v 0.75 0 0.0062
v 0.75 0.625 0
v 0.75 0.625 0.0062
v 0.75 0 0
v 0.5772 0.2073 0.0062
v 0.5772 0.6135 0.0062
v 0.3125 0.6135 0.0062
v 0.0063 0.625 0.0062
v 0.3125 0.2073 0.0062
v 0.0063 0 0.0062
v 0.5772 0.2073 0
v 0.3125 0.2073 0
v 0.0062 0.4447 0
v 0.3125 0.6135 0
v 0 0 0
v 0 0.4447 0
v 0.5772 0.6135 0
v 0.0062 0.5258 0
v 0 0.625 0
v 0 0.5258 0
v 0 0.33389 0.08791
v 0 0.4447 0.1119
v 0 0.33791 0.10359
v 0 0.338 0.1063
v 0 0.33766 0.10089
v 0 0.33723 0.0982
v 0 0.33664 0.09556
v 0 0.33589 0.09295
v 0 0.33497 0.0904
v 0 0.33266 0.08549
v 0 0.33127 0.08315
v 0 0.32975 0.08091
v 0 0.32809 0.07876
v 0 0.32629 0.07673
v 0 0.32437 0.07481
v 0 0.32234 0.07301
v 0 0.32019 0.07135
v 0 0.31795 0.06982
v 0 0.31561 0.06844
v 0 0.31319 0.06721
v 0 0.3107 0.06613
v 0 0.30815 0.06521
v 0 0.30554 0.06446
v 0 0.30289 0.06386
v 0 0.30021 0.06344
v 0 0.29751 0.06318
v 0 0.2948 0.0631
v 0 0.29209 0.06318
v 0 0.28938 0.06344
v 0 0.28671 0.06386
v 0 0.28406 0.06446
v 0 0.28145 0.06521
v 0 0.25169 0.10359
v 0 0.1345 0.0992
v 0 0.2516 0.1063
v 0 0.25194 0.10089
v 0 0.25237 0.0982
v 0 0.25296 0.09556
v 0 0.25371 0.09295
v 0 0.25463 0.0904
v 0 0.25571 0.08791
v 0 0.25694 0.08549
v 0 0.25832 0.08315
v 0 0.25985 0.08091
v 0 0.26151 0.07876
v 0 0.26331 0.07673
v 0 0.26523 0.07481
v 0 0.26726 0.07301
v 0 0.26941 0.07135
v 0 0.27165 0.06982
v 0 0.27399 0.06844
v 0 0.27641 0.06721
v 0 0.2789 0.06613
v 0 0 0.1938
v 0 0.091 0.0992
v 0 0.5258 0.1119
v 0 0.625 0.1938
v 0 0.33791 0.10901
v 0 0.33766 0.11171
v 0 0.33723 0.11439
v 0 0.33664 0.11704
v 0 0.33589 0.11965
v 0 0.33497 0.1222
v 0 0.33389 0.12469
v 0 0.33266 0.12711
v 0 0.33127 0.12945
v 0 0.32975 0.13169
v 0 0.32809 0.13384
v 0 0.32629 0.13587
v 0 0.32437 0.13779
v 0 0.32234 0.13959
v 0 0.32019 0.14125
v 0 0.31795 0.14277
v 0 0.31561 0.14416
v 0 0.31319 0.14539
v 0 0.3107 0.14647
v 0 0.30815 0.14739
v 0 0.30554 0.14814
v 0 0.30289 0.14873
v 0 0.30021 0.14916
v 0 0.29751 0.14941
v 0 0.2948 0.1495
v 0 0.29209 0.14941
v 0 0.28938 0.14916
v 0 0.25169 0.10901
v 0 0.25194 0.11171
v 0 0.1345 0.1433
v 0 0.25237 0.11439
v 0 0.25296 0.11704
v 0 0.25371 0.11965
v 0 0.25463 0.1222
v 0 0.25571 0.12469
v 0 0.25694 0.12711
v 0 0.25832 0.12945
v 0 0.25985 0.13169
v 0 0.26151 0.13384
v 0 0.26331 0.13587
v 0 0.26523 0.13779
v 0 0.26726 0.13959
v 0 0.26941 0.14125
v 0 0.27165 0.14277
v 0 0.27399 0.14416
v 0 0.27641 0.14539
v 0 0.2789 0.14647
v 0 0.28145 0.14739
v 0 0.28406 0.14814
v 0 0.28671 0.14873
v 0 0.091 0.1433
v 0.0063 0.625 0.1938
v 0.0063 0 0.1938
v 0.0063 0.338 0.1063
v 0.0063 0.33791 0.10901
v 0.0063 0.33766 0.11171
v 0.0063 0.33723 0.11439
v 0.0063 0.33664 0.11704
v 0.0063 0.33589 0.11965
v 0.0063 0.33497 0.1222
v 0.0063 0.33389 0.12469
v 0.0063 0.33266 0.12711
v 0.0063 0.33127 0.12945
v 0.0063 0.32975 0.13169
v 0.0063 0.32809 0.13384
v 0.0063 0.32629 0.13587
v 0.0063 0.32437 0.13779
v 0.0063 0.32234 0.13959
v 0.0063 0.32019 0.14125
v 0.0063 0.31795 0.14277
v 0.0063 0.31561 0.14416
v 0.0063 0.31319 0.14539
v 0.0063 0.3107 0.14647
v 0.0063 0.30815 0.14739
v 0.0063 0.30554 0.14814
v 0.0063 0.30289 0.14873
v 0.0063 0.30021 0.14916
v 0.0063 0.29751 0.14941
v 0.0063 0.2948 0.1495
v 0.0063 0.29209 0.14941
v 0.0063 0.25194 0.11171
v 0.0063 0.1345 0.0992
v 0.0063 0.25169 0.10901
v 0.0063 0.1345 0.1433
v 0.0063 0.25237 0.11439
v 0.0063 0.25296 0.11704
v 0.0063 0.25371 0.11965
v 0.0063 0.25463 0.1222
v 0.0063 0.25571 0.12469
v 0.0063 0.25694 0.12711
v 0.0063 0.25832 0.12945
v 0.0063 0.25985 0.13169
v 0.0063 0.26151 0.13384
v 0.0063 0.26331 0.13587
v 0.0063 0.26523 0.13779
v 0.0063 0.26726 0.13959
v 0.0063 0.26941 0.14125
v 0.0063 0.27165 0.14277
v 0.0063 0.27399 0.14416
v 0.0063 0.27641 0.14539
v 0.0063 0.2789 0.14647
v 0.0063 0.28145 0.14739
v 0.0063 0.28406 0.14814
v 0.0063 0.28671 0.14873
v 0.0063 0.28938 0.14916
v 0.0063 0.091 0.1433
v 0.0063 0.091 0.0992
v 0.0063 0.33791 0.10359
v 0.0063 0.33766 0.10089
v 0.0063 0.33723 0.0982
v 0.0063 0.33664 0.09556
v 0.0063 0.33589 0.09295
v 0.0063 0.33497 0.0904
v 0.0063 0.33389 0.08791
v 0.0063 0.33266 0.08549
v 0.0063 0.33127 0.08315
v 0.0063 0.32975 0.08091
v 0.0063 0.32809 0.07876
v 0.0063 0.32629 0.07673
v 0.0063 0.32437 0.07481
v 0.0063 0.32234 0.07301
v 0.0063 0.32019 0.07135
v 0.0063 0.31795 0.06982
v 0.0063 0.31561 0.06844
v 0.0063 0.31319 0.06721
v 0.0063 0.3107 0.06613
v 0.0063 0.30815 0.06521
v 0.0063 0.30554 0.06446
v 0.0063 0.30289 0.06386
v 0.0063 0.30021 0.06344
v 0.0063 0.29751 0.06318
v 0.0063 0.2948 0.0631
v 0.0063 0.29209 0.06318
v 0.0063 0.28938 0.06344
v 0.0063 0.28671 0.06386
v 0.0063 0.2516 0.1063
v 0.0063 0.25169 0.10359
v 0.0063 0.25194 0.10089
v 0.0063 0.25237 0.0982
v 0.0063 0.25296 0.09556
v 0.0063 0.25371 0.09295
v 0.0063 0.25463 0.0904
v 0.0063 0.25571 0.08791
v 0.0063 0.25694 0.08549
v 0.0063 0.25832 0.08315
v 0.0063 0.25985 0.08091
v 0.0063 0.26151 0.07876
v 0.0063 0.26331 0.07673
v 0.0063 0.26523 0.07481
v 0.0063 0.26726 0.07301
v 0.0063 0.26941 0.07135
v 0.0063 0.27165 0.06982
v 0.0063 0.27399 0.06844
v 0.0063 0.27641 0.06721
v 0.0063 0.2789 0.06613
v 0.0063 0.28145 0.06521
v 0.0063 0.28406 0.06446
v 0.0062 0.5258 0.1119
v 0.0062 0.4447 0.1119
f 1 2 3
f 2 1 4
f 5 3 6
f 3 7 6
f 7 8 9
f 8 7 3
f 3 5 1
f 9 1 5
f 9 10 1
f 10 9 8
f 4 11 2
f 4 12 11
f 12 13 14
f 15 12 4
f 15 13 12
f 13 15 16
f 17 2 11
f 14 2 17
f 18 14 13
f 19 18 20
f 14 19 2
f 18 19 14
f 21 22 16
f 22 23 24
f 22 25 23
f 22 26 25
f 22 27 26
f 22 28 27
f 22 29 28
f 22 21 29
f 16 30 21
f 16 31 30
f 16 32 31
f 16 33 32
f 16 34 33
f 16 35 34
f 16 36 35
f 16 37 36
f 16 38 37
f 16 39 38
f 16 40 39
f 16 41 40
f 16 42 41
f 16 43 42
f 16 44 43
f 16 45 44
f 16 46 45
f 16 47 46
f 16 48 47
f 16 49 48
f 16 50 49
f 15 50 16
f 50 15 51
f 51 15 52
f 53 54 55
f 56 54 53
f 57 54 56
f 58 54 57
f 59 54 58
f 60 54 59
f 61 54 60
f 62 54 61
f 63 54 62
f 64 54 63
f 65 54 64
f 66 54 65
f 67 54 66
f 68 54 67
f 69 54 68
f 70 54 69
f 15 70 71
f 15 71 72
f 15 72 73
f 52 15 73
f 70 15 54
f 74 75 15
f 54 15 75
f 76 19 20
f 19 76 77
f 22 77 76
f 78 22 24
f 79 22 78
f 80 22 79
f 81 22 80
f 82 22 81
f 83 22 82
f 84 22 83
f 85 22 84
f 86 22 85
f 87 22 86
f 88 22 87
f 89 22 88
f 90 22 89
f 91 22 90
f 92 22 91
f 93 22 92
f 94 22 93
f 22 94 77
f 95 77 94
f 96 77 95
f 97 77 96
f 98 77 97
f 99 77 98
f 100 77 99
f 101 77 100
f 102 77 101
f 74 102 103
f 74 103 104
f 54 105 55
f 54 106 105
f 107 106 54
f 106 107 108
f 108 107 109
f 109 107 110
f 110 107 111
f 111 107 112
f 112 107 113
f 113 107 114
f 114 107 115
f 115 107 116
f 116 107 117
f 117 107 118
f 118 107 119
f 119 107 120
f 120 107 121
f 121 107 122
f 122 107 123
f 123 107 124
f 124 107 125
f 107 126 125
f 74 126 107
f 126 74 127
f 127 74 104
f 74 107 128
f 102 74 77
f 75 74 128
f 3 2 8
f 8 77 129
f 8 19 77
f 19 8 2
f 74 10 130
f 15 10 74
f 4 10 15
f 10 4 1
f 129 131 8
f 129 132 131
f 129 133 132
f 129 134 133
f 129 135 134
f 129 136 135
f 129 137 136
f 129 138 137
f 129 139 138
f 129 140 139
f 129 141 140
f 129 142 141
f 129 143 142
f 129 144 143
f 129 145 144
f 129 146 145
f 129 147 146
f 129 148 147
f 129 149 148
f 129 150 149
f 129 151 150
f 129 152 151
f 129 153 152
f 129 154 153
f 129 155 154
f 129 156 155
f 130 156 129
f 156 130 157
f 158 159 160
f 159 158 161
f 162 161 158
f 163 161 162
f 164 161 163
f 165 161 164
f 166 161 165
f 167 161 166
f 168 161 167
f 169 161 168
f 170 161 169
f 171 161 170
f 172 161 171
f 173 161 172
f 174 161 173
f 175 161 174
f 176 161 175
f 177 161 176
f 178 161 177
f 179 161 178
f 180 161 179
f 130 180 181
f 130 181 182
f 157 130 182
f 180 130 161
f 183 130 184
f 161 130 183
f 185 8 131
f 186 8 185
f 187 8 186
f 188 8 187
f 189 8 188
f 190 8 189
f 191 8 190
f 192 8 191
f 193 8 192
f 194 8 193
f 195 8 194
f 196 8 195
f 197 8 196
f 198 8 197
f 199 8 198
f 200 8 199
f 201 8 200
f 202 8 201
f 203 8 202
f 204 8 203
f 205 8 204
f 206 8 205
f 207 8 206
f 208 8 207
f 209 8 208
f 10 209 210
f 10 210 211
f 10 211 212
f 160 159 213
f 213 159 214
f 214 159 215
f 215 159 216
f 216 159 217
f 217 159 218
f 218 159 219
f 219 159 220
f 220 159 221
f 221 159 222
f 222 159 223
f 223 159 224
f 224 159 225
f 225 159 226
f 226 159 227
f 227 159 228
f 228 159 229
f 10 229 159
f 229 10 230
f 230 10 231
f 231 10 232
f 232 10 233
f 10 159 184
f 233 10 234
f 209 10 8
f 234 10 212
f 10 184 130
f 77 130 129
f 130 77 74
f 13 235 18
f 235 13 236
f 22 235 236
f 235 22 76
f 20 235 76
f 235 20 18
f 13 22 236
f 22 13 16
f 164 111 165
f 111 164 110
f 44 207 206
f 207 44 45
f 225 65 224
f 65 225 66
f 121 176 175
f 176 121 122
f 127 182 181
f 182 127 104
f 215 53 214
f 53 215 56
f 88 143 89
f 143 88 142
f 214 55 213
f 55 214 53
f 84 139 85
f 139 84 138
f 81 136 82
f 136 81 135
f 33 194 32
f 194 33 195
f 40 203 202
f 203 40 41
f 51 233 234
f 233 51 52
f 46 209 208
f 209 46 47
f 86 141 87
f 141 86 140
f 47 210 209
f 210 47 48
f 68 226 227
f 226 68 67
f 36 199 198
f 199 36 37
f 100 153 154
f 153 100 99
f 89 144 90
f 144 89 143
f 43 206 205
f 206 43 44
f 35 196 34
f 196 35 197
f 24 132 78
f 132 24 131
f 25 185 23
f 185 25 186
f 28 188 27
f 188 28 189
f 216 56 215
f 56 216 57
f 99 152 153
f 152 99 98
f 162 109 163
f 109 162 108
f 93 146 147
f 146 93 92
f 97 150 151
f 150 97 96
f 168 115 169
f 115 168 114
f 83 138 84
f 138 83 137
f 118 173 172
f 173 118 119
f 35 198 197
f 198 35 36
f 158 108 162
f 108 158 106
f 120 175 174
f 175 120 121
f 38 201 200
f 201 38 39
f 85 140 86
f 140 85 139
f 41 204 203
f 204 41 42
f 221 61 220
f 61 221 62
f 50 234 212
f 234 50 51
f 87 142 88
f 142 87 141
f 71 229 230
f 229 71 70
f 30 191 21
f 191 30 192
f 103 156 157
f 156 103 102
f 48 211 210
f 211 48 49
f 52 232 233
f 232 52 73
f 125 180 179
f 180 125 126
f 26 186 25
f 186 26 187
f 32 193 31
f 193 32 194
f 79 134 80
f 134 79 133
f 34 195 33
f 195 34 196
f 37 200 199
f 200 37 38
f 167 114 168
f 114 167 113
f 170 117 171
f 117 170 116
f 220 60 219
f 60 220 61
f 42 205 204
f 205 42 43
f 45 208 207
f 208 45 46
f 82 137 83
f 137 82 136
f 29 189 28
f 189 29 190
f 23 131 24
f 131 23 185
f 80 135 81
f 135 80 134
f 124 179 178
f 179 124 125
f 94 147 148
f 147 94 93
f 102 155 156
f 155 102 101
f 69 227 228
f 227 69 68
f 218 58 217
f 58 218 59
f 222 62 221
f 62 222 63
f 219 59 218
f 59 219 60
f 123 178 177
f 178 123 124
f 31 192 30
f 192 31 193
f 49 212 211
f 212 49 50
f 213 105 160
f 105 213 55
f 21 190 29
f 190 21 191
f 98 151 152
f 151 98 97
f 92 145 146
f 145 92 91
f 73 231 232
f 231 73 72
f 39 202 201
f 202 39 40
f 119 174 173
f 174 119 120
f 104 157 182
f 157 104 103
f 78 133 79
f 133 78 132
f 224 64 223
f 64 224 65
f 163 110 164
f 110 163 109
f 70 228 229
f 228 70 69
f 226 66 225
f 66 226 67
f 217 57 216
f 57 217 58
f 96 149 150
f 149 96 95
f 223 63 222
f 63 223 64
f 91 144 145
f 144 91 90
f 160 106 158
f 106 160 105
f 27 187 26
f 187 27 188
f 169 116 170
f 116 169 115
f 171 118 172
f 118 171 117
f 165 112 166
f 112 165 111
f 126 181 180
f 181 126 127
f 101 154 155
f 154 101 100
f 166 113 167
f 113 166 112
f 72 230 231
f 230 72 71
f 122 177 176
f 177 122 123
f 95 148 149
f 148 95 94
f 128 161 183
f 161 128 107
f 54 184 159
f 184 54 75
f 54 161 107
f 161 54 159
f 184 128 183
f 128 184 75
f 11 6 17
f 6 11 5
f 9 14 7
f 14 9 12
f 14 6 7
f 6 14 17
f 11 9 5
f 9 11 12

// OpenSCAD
// === Parametric Dimensions ===

// Base plate
base_length = 0.75;
base_width = 0.625;
base_height_nominal = 0.00625;
base_solid_height = 0.0062; // solid extension upward from base datum

// Left upright wall
wall_thickness = 0.0063;
wall_width = 0.625;         // flush with front and back edges
wall_left_offset = 0;
wall_right_offset = 0.7437; // from right edge of base to right edge of wall
wall_rise_above_plate = 0.1875;
wall_total_height = 0.1938; // total reach from base datum

// Cut 1: Lower rectangular opening through wall
cut1_along_wall = 0.081103; // y-span
cut1_height = 0.111891;     // z-span
cut1_front_offset = 0.4447;
cut1_back_offset = 0.0992;
cut1_z_bottom = 0;
cut1_z_top = 0.1119;
cut1_reach = 0.0062;        // x-depth through wall

// Cut 2: Circular through-hole in wall
cut2_radius = 0.0432;
cut2_left_offset = 0;       // axis at left face of wall
cut2_front_offset = 0.2948; // axis y-position from front
cut2_z_bottom = 0.0631;
cut2_z_top = 0.1495;
cut2_reach = 0.0625;        // x-depth of cylindrical cut

// Cut 3: Smaller rectangular through opening in wall
cut3_along_wall = 0.043521; // y-span
cut3_height = 0.044108;     // z-span
cut3_front_offset = 0.091;
cut3_back_offset = 0.4905;
cut3_z_bottom = 0.0992;
cut3_z_top = 0.1433;
cut3_reach = 0.0625;        // x-depth through wall

// Cut 4: Rectangular through opening in base plate
cut4_x_span = 0.264669;
cut4_y_span = 0.40625;
cut4_left_offset = 0.3125;
cut4_right_offset = 0.1728;
cut4_front_offset = 0.2073;
cut4_back_offset = 0.0115;
cut4_z_bottom = -0.0562;
cut4_z_top = 0.0063;

// Resolution and tolerance
$fn = 100;
eps = 0.0001;

// === Main Model ===
difference() {
    // Solid body: base plate + left wall
    union() {
        // Base plate (solid portion extending 0.0062 upward)
        cube([base_length, base_width, base_solid_height]);

        // Left upright wall along left edge, flush front/back
        // x: 0 to wall_thickness, y: 0 to wall_width, z: 0 to wall_total_height
        cube([wall_thickness, wall_width, wall_total_height]);
    }

    // Cut 1: Lower rectangular opening through wall thickness
    // y-position: front offset from y=0, back offset from y=base_width
    translate([-eps, cut1_front_offset, cut1_z_bottom])
        cube([
            cut1_reach + eps,
            base_width - cut1_front_offset - cut1_back_offset,
            cut1_z_top - cut1_z_bottom
        ]);

    // Cut 2: Circular through-hole in wall
    // Axis at left face (x=0), front offset gives y-center, z-center from height band
    translate([-eps, cut2_front_offset, (cut2_z_bottom + cut2_z_top) / 2])
        rotate([0, 90, 0])
            cylinder(h=cut2_reach + eps, r=cut2_radius);

    // Cut 3: Smaller rectangular through opening in wall
    translate([-eps, cut3_front_offset, cut3_z_bottom])
        cube([
            cut3_reach + eps,
            base_width - cut3_front_offset - cut3_back_offset,
            cut3_z_top - cut3_z_bottom
        ]);

    // Cut 4: Rectangular through opening in horizontal base plate
    // Fully passes through the thin plate (z-band extends below and above plate)
    translate([cut4_left_offset, cut4_front_offset, cut4_z_bottom])
        cube([
            base_length - cut4_left_offset - cut4_right_offset,
            base_width - cut4_front_offset - cut4_back_offset,
            cut4_z_top - cut4_z_bottom
        ]);
}
